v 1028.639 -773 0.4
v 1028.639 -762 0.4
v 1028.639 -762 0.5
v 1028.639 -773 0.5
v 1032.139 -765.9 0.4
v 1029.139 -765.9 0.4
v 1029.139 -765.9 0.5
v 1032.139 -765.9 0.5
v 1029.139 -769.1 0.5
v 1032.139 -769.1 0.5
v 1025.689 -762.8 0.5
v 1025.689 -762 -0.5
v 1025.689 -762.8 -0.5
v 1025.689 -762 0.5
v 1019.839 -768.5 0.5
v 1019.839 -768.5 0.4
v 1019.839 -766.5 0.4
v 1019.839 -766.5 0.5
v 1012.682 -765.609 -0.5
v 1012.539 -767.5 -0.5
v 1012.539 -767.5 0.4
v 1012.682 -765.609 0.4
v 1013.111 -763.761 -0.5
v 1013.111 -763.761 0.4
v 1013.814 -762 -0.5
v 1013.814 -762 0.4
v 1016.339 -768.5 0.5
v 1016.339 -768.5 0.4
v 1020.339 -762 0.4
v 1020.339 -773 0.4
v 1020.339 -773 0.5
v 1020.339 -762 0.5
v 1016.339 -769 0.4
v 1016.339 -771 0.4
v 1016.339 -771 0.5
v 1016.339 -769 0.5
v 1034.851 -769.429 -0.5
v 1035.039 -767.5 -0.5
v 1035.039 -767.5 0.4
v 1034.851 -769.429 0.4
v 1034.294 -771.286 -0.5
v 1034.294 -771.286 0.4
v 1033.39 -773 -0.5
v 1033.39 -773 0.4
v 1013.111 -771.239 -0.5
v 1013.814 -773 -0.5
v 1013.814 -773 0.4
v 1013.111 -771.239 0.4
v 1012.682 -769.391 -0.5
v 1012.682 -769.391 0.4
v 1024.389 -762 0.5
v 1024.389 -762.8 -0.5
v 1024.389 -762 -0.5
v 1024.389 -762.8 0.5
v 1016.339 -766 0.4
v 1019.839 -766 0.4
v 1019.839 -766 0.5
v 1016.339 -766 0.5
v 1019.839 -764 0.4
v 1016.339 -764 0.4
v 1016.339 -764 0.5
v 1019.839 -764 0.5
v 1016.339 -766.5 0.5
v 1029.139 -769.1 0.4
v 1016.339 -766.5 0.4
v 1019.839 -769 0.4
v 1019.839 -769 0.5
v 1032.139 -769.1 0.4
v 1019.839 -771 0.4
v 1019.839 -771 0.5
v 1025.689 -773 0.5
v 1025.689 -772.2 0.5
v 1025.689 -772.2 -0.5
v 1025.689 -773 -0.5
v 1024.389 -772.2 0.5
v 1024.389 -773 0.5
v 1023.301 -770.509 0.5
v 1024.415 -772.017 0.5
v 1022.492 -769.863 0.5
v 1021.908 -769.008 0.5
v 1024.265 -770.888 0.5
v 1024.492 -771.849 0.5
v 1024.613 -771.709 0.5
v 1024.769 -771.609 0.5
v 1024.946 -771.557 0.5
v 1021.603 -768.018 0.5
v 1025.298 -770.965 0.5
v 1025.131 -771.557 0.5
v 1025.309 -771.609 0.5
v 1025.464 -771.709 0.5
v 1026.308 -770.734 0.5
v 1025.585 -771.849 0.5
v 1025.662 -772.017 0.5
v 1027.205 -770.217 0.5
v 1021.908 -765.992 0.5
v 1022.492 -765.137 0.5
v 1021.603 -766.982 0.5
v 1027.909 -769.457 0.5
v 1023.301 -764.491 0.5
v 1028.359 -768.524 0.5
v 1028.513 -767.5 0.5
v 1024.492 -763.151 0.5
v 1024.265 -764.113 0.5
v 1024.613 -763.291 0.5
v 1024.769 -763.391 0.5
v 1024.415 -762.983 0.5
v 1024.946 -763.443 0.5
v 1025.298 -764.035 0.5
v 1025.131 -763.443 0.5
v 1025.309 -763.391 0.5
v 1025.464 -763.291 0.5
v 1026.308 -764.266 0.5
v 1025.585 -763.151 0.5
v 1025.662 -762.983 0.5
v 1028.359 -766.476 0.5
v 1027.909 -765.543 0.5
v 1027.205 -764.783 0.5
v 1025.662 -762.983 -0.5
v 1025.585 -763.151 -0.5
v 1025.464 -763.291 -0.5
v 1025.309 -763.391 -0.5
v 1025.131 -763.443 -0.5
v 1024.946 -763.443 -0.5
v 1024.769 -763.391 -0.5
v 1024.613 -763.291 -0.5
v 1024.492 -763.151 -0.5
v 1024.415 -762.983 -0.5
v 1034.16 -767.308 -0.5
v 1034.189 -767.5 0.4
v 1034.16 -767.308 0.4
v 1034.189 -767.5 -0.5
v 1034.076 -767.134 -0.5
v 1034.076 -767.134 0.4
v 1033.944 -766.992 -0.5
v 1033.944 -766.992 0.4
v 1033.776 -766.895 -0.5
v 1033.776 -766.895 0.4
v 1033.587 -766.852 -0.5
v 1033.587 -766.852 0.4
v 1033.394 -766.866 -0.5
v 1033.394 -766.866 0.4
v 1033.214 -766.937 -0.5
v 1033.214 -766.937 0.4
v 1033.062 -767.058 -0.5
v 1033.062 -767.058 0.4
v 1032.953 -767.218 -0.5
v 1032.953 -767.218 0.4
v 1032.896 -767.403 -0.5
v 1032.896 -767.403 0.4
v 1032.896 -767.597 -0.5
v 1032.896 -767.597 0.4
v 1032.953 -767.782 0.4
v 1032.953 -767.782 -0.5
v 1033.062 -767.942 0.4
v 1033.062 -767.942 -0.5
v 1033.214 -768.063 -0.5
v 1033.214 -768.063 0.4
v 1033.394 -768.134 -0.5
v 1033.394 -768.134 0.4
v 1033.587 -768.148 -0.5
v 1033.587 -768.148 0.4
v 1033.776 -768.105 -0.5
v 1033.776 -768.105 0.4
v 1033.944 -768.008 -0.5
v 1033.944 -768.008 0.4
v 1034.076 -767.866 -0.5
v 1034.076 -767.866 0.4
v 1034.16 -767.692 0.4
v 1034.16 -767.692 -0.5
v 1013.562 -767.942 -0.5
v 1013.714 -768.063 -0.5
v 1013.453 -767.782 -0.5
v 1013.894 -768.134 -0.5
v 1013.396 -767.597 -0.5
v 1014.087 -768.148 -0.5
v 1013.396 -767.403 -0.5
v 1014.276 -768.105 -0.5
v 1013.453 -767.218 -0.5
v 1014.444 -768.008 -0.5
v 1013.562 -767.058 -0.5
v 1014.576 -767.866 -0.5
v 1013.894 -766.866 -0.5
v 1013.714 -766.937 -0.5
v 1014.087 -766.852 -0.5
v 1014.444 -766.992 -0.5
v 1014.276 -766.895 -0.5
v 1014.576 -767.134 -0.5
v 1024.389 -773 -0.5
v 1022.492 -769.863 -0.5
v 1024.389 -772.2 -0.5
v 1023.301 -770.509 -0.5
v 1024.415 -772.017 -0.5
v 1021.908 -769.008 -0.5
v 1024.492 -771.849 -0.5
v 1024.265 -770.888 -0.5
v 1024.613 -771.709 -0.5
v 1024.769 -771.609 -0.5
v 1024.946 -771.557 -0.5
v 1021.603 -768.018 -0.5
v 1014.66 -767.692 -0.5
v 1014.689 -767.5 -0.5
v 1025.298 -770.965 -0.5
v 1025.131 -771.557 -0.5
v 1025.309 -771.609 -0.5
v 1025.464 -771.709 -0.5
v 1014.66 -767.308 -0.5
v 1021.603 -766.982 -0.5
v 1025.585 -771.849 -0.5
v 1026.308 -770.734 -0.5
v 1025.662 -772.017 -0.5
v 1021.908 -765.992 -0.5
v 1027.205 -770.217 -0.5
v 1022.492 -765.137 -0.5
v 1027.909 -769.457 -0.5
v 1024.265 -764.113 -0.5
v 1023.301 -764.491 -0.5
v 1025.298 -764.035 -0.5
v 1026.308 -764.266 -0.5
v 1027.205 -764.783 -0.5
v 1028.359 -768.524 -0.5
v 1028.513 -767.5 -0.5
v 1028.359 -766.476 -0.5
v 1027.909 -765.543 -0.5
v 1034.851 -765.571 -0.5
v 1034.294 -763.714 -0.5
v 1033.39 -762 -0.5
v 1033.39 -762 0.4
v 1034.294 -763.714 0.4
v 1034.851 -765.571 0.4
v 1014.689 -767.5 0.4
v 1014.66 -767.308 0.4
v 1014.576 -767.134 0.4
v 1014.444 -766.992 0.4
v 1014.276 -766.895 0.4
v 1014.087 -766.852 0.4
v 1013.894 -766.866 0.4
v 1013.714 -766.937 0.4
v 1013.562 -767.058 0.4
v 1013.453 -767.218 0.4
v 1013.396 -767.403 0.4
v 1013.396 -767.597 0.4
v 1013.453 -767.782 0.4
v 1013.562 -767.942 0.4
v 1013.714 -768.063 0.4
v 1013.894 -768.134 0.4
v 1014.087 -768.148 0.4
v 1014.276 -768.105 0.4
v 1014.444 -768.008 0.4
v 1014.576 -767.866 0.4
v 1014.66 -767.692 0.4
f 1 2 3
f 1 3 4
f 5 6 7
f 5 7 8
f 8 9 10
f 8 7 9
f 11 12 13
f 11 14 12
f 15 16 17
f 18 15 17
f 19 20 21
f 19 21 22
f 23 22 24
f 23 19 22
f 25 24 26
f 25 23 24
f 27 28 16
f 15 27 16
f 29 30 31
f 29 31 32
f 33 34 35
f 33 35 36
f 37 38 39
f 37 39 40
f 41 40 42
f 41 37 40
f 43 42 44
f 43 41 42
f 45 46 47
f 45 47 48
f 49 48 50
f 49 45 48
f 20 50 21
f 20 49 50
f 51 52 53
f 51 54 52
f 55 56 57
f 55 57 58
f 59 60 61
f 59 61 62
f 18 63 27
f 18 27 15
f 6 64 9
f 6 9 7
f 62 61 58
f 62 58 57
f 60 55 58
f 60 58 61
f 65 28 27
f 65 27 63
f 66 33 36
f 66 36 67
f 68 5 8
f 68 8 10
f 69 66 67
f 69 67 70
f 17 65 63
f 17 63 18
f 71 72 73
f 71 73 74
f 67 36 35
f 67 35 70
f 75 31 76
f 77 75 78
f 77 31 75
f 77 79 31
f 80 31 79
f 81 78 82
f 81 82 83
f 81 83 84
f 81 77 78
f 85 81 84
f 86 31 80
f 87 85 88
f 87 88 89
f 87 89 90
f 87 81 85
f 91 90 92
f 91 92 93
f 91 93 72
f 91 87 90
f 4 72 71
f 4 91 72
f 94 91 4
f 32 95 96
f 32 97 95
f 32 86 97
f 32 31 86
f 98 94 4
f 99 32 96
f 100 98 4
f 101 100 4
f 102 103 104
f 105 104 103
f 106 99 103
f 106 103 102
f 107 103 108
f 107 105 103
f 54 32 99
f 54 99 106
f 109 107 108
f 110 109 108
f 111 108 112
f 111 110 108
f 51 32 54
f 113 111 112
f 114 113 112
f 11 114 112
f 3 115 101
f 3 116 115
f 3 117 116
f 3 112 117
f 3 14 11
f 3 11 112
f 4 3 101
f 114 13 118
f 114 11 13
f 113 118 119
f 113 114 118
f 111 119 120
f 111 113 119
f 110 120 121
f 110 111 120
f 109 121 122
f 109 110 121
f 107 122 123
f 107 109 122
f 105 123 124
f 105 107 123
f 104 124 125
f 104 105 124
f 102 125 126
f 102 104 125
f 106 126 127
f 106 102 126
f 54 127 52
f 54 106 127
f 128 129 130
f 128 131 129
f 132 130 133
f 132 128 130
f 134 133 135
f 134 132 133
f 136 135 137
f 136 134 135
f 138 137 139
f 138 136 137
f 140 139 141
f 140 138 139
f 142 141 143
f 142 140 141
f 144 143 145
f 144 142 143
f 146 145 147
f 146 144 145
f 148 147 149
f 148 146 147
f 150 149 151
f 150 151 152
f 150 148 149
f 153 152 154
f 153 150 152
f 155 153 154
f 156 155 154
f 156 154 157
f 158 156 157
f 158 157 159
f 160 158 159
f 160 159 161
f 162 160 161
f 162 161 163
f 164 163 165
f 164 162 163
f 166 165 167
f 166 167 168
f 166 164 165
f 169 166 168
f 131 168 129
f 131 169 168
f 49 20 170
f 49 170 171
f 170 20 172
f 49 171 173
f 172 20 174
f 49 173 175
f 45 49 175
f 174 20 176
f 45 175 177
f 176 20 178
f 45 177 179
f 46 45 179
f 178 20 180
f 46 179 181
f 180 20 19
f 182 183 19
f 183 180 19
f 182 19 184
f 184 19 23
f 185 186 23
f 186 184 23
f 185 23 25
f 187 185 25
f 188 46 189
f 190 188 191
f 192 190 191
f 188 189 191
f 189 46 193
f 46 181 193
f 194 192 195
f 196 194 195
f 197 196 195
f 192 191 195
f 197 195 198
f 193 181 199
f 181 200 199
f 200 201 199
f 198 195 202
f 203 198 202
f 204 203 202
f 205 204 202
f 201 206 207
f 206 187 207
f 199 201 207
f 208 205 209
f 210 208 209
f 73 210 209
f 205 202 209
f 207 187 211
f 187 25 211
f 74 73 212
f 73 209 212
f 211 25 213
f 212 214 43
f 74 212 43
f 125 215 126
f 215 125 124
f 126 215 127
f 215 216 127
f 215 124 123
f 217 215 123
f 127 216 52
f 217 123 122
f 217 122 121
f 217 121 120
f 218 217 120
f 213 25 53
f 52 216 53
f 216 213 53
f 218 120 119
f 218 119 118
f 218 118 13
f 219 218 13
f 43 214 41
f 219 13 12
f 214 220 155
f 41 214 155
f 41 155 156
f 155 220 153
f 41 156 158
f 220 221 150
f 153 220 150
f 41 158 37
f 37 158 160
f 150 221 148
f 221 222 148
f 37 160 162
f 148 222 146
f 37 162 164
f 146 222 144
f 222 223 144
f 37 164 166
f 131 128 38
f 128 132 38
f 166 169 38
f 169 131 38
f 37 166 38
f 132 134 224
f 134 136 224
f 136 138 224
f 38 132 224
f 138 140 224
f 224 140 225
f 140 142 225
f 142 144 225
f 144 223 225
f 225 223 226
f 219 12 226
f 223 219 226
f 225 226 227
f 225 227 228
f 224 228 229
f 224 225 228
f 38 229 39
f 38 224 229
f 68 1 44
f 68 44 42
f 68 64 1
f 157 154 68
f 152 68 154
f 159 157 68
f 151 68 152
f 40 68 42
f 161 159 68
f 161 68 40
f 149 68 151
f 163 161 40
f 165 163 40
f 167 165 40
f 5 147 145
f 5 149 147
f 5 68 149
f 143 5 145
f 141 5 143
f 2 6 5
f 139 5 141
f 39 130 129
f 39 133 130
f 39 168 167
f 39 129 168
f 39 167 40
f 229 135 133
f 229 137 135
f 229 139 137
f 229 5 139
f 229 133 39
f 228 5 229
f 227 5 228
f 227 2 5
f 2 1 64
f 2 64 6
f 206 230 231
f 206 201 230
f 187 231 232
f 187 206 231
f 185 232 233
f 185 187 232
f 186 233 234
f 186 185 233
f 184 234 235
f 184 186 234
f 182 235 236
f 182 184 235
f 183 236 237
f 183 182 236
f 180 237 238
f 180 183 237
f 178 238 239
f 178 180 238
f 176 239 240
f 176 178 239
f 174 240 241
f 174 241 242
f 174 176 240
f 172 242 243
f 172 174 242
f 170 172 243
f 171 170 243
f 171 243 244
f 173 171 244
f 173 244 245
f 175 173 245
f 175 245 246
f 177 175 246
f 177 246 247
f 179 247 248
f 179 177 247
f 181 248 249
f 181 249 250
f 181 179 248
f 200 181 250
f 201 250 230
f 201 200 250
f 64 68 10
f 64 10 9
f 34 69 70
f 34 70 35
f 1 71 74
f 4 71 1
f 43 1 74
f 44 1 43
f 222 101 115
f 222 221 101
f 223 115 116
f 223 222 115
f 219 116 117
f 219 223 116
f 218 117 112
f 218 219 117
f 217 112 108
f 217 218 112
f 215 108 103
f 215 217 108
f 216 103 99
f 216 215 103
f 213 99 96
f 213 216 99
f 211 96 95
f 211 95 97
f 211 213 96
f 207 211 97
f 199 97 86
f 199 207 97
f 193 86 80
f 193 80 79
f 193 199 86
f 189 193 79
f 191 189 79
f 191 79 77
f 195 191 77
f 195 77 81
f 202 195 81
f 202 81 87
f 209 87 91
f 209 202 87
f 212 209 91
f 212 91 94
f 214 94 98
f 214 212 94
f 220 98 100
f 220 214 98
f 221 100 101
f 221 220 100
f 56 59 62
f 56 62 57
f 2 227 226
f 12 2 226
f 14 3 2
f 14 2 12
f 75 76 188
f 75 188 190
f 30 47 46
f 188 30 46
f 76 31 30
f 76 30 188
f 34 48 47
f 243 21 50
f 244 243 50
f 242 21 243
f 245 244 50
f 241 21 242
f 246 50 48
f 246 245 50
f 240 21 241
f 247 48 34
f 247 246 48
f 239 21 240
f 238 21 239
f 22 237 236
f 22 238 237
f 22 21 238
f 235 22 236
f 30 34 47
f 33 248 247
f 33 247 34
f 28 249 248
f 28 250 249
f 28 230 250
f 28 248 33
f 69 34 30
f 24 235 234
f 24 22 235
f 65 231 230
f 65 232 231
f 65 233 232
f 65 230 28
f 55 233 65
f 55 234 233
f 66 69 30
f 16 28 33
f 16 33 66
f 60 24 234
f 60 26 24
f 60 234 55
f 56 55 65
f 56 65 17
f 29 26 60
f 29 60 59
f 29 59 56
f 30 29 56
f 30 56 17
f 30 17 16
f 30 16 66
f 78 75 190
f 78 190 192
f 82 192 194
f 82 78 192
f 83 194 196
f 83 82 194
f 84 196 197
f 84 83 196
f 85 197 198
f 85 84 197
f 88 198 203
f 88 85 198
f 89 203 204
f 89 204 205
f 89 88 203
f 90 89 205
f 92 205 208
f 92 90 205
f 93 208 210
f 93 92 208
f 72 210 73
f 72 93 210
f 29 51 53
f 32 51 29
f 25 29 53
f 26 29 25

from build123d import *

# Parameters (mm, degrees)
MODEL_R         = 0.65
MODEL_R_2       = 3.4746057
EXTRUDE_1_DEPTH = 0.5
EXTRUDE2_START  = -0.1
SKETCH2_R       = 0.65
SKETCH2_W       = 3.5
SKETCH2_H       = 2
EXTRUDE2_DEPTH  = 0.1
EXTRUDE1_START  = -0.5
EXTRUDE1_DEPTH  = 0.9


# Read off the part's stored shape, not the designer's step: Extrude1
with BuildPart() as part:
    # Model → Бобышка-Вытянуть1 (new, symmetric)
    with BuildSketch(Plane.XY):
        with BuildLine():
            Line((1024.38859, -762.8000398), (1024.38859, -762.0000398))
            Line((1024.38859, -762.0000398), (1012.53859, -762.0000398))
            Line((1012.53859, -762.0000398), (1012.53859, -773.0000398))
            Line((1012.53859, -773.0000398), (1024.38859, -773.0000398))
            Line((1024.38859, -773.0000398), (1024.38859, -772.2000398))
            ThreePointArc((1024.38859, -772.2000398), (1025.03859, -771.5500398), (1025.68859, -772.2000398))
            Line((1025.68859, -772.2000398), (1025.68859, -773.0000398))
            Line((1025.68859, -773.0000398), (1035.03859, -773.0000398))
            Line((1035.03859, -773.0000398), (1035.03859, -762.0000398))
            Line((1035.03859, -762.0000398), (1025.68859, -762.0000398))
            Line((1025.68859, -762.0000398), (1025.68859, -762.8000398))
            ThreePointArc((1025.68859, -762.8000398), (1025.03859, -763.4500398), (1024.38859, -762.8000398))
        make_face()
        with Locations((1033.53859, -767.5000398)):
            Circle(MODEL_R, mode=Mode.SUBTRACT)
        with Locations((1025.03859, -767.5000398)):
            Circle(MODEL_R_2, mode=Mode.SUBTRACT)
        with Locations((1014.03859, -767.5000398)):
            Circle(MODEL_R, mode=Mode.SUBTRACT)
    extrude(amount=EXTRUDE_1_DEPTH, both=True)

    # Sketch2 → Extrude2 (cut)
    # profile 1 of 2: a face of its own
    with BuildSketch(Plane.XY.offset(0.5).offset(EXTRUDE2_START)):
        Polygon((1020.33859, -764.0000398), (1020.33859, -762.0000398), (1012.53859, -762.0000398), (1012.53859, -773.0000398), (1020.33859, -773.0000398), (1020.33859, -771.0000398), (1020.33859, -769.0000398), (1020.33859, -766.0000398), align=None)
        with Locations((1014.03859, -767.5000398)):
            Circle(SKETCH2_R, mode=Mode.SUBTRACT)
        Polygon((1016.33859, -770.1000398), (1016.33859, -769.0000398), (1019.83859, -769.0000398), (1019.83859, -771.0000398), (1016.33859, -771.0000398), align=None, mode=Mode.SUBTRACT)
        with Locations((1018.08859, -767.5000398)):
            Rectangle(SKETCH2_W, SKETCH2_H, mode=Mode.SUBTRACT)
        Polygon((1019.83859, -764.0000398), (1019.83859, -766.0000398), (1016.33859, -766.0000398), (1016.33859, -764.9000398), (1016.33859, -764.0000398), align=None, mode=Mode.SUBTRACT)
    # profile 2 of 2: a face of its own
    with BuildSketch(Plane.XY.offset(0.5).offset(EXTRUDE2_START)):
        Polygon((1035.03859, -762.0000398), (1028.63859, -762.0000398), (1028.63859, -767.5000398), (1028.63859, -773.0000398), (1035.03859, -773.0000398), align=None)
        with Locations((1033.53859, -767.5000398)):
            Circle(SKETCH2_R, mode=Mode.SUBTRACT)
        Polygon((1029.13859, -769.1000398), (1029.13859, -767.5000398), (1029.13859, -765.9000398), (1032.13859, -765.9000398), (1032.13859, -767.5000398), (1032.13859, -769.1000398), align=None, mode=Mode.SUBTRACT)
    extrude(amount=EXTRUDE2_DEPTH, mode=Mode.SUBTRACT)

    # Extrude1 outline → Extrude1 (cut)
    with BuildSketch(Plane.XY.offset(EXTRUDE1_START)):
        with BuildLine():
            ThreePointArc((1013.81361784, -773.0000398), (1012.861518267, -770.322968067), (1012.53859, -767.5000398))
            Line((1012.53859, -767.5000398), (1012.53859, -773.0000398))
            Line((1012.53859, -773.0000398), (1013.81361784, -773.0000398))
        make_face()
        with BuildLine():
            ThreePointArc((1012.53859, -767.5000398), (1012.861518267, -764.677111533), (1013.81361784, -762.0000398))
            Line((1013.81361784, -762.0000398), (1012.53859, -762.0000398))
            Line((1012.53859, -762.0000398), (1012.53859, -767.5000398))
        make_face()
        with BuildLine():
            ThreePointArc((1033.390236544, -762.0000398), (1034.617641765, -764.629191967), (1035.03859, -767.5000398))
            Line((1035.03859, -767.5000398), (1035.03859, -762.0000398))
            Line((1035.03859, -762.0000398), (1033.390236544, -762.0000398))
        make_face()
        with BuildLine():
            ThreePointArc((1035.03859, -767.5000398), (1034.617641765, -770.370887633), (1033.390236544, -773.0000398))
            Line((1033.390236544, -773.0000398), (1035.03859, -773.0000398))
            Line((1035.03859, -773.0000398), (1035.03859, -767.5000398))
        make_face()
    extrude(amount=EXTRUDE1_DEPTH, mode=Mode.SUBTRACT)


solid = part.part
